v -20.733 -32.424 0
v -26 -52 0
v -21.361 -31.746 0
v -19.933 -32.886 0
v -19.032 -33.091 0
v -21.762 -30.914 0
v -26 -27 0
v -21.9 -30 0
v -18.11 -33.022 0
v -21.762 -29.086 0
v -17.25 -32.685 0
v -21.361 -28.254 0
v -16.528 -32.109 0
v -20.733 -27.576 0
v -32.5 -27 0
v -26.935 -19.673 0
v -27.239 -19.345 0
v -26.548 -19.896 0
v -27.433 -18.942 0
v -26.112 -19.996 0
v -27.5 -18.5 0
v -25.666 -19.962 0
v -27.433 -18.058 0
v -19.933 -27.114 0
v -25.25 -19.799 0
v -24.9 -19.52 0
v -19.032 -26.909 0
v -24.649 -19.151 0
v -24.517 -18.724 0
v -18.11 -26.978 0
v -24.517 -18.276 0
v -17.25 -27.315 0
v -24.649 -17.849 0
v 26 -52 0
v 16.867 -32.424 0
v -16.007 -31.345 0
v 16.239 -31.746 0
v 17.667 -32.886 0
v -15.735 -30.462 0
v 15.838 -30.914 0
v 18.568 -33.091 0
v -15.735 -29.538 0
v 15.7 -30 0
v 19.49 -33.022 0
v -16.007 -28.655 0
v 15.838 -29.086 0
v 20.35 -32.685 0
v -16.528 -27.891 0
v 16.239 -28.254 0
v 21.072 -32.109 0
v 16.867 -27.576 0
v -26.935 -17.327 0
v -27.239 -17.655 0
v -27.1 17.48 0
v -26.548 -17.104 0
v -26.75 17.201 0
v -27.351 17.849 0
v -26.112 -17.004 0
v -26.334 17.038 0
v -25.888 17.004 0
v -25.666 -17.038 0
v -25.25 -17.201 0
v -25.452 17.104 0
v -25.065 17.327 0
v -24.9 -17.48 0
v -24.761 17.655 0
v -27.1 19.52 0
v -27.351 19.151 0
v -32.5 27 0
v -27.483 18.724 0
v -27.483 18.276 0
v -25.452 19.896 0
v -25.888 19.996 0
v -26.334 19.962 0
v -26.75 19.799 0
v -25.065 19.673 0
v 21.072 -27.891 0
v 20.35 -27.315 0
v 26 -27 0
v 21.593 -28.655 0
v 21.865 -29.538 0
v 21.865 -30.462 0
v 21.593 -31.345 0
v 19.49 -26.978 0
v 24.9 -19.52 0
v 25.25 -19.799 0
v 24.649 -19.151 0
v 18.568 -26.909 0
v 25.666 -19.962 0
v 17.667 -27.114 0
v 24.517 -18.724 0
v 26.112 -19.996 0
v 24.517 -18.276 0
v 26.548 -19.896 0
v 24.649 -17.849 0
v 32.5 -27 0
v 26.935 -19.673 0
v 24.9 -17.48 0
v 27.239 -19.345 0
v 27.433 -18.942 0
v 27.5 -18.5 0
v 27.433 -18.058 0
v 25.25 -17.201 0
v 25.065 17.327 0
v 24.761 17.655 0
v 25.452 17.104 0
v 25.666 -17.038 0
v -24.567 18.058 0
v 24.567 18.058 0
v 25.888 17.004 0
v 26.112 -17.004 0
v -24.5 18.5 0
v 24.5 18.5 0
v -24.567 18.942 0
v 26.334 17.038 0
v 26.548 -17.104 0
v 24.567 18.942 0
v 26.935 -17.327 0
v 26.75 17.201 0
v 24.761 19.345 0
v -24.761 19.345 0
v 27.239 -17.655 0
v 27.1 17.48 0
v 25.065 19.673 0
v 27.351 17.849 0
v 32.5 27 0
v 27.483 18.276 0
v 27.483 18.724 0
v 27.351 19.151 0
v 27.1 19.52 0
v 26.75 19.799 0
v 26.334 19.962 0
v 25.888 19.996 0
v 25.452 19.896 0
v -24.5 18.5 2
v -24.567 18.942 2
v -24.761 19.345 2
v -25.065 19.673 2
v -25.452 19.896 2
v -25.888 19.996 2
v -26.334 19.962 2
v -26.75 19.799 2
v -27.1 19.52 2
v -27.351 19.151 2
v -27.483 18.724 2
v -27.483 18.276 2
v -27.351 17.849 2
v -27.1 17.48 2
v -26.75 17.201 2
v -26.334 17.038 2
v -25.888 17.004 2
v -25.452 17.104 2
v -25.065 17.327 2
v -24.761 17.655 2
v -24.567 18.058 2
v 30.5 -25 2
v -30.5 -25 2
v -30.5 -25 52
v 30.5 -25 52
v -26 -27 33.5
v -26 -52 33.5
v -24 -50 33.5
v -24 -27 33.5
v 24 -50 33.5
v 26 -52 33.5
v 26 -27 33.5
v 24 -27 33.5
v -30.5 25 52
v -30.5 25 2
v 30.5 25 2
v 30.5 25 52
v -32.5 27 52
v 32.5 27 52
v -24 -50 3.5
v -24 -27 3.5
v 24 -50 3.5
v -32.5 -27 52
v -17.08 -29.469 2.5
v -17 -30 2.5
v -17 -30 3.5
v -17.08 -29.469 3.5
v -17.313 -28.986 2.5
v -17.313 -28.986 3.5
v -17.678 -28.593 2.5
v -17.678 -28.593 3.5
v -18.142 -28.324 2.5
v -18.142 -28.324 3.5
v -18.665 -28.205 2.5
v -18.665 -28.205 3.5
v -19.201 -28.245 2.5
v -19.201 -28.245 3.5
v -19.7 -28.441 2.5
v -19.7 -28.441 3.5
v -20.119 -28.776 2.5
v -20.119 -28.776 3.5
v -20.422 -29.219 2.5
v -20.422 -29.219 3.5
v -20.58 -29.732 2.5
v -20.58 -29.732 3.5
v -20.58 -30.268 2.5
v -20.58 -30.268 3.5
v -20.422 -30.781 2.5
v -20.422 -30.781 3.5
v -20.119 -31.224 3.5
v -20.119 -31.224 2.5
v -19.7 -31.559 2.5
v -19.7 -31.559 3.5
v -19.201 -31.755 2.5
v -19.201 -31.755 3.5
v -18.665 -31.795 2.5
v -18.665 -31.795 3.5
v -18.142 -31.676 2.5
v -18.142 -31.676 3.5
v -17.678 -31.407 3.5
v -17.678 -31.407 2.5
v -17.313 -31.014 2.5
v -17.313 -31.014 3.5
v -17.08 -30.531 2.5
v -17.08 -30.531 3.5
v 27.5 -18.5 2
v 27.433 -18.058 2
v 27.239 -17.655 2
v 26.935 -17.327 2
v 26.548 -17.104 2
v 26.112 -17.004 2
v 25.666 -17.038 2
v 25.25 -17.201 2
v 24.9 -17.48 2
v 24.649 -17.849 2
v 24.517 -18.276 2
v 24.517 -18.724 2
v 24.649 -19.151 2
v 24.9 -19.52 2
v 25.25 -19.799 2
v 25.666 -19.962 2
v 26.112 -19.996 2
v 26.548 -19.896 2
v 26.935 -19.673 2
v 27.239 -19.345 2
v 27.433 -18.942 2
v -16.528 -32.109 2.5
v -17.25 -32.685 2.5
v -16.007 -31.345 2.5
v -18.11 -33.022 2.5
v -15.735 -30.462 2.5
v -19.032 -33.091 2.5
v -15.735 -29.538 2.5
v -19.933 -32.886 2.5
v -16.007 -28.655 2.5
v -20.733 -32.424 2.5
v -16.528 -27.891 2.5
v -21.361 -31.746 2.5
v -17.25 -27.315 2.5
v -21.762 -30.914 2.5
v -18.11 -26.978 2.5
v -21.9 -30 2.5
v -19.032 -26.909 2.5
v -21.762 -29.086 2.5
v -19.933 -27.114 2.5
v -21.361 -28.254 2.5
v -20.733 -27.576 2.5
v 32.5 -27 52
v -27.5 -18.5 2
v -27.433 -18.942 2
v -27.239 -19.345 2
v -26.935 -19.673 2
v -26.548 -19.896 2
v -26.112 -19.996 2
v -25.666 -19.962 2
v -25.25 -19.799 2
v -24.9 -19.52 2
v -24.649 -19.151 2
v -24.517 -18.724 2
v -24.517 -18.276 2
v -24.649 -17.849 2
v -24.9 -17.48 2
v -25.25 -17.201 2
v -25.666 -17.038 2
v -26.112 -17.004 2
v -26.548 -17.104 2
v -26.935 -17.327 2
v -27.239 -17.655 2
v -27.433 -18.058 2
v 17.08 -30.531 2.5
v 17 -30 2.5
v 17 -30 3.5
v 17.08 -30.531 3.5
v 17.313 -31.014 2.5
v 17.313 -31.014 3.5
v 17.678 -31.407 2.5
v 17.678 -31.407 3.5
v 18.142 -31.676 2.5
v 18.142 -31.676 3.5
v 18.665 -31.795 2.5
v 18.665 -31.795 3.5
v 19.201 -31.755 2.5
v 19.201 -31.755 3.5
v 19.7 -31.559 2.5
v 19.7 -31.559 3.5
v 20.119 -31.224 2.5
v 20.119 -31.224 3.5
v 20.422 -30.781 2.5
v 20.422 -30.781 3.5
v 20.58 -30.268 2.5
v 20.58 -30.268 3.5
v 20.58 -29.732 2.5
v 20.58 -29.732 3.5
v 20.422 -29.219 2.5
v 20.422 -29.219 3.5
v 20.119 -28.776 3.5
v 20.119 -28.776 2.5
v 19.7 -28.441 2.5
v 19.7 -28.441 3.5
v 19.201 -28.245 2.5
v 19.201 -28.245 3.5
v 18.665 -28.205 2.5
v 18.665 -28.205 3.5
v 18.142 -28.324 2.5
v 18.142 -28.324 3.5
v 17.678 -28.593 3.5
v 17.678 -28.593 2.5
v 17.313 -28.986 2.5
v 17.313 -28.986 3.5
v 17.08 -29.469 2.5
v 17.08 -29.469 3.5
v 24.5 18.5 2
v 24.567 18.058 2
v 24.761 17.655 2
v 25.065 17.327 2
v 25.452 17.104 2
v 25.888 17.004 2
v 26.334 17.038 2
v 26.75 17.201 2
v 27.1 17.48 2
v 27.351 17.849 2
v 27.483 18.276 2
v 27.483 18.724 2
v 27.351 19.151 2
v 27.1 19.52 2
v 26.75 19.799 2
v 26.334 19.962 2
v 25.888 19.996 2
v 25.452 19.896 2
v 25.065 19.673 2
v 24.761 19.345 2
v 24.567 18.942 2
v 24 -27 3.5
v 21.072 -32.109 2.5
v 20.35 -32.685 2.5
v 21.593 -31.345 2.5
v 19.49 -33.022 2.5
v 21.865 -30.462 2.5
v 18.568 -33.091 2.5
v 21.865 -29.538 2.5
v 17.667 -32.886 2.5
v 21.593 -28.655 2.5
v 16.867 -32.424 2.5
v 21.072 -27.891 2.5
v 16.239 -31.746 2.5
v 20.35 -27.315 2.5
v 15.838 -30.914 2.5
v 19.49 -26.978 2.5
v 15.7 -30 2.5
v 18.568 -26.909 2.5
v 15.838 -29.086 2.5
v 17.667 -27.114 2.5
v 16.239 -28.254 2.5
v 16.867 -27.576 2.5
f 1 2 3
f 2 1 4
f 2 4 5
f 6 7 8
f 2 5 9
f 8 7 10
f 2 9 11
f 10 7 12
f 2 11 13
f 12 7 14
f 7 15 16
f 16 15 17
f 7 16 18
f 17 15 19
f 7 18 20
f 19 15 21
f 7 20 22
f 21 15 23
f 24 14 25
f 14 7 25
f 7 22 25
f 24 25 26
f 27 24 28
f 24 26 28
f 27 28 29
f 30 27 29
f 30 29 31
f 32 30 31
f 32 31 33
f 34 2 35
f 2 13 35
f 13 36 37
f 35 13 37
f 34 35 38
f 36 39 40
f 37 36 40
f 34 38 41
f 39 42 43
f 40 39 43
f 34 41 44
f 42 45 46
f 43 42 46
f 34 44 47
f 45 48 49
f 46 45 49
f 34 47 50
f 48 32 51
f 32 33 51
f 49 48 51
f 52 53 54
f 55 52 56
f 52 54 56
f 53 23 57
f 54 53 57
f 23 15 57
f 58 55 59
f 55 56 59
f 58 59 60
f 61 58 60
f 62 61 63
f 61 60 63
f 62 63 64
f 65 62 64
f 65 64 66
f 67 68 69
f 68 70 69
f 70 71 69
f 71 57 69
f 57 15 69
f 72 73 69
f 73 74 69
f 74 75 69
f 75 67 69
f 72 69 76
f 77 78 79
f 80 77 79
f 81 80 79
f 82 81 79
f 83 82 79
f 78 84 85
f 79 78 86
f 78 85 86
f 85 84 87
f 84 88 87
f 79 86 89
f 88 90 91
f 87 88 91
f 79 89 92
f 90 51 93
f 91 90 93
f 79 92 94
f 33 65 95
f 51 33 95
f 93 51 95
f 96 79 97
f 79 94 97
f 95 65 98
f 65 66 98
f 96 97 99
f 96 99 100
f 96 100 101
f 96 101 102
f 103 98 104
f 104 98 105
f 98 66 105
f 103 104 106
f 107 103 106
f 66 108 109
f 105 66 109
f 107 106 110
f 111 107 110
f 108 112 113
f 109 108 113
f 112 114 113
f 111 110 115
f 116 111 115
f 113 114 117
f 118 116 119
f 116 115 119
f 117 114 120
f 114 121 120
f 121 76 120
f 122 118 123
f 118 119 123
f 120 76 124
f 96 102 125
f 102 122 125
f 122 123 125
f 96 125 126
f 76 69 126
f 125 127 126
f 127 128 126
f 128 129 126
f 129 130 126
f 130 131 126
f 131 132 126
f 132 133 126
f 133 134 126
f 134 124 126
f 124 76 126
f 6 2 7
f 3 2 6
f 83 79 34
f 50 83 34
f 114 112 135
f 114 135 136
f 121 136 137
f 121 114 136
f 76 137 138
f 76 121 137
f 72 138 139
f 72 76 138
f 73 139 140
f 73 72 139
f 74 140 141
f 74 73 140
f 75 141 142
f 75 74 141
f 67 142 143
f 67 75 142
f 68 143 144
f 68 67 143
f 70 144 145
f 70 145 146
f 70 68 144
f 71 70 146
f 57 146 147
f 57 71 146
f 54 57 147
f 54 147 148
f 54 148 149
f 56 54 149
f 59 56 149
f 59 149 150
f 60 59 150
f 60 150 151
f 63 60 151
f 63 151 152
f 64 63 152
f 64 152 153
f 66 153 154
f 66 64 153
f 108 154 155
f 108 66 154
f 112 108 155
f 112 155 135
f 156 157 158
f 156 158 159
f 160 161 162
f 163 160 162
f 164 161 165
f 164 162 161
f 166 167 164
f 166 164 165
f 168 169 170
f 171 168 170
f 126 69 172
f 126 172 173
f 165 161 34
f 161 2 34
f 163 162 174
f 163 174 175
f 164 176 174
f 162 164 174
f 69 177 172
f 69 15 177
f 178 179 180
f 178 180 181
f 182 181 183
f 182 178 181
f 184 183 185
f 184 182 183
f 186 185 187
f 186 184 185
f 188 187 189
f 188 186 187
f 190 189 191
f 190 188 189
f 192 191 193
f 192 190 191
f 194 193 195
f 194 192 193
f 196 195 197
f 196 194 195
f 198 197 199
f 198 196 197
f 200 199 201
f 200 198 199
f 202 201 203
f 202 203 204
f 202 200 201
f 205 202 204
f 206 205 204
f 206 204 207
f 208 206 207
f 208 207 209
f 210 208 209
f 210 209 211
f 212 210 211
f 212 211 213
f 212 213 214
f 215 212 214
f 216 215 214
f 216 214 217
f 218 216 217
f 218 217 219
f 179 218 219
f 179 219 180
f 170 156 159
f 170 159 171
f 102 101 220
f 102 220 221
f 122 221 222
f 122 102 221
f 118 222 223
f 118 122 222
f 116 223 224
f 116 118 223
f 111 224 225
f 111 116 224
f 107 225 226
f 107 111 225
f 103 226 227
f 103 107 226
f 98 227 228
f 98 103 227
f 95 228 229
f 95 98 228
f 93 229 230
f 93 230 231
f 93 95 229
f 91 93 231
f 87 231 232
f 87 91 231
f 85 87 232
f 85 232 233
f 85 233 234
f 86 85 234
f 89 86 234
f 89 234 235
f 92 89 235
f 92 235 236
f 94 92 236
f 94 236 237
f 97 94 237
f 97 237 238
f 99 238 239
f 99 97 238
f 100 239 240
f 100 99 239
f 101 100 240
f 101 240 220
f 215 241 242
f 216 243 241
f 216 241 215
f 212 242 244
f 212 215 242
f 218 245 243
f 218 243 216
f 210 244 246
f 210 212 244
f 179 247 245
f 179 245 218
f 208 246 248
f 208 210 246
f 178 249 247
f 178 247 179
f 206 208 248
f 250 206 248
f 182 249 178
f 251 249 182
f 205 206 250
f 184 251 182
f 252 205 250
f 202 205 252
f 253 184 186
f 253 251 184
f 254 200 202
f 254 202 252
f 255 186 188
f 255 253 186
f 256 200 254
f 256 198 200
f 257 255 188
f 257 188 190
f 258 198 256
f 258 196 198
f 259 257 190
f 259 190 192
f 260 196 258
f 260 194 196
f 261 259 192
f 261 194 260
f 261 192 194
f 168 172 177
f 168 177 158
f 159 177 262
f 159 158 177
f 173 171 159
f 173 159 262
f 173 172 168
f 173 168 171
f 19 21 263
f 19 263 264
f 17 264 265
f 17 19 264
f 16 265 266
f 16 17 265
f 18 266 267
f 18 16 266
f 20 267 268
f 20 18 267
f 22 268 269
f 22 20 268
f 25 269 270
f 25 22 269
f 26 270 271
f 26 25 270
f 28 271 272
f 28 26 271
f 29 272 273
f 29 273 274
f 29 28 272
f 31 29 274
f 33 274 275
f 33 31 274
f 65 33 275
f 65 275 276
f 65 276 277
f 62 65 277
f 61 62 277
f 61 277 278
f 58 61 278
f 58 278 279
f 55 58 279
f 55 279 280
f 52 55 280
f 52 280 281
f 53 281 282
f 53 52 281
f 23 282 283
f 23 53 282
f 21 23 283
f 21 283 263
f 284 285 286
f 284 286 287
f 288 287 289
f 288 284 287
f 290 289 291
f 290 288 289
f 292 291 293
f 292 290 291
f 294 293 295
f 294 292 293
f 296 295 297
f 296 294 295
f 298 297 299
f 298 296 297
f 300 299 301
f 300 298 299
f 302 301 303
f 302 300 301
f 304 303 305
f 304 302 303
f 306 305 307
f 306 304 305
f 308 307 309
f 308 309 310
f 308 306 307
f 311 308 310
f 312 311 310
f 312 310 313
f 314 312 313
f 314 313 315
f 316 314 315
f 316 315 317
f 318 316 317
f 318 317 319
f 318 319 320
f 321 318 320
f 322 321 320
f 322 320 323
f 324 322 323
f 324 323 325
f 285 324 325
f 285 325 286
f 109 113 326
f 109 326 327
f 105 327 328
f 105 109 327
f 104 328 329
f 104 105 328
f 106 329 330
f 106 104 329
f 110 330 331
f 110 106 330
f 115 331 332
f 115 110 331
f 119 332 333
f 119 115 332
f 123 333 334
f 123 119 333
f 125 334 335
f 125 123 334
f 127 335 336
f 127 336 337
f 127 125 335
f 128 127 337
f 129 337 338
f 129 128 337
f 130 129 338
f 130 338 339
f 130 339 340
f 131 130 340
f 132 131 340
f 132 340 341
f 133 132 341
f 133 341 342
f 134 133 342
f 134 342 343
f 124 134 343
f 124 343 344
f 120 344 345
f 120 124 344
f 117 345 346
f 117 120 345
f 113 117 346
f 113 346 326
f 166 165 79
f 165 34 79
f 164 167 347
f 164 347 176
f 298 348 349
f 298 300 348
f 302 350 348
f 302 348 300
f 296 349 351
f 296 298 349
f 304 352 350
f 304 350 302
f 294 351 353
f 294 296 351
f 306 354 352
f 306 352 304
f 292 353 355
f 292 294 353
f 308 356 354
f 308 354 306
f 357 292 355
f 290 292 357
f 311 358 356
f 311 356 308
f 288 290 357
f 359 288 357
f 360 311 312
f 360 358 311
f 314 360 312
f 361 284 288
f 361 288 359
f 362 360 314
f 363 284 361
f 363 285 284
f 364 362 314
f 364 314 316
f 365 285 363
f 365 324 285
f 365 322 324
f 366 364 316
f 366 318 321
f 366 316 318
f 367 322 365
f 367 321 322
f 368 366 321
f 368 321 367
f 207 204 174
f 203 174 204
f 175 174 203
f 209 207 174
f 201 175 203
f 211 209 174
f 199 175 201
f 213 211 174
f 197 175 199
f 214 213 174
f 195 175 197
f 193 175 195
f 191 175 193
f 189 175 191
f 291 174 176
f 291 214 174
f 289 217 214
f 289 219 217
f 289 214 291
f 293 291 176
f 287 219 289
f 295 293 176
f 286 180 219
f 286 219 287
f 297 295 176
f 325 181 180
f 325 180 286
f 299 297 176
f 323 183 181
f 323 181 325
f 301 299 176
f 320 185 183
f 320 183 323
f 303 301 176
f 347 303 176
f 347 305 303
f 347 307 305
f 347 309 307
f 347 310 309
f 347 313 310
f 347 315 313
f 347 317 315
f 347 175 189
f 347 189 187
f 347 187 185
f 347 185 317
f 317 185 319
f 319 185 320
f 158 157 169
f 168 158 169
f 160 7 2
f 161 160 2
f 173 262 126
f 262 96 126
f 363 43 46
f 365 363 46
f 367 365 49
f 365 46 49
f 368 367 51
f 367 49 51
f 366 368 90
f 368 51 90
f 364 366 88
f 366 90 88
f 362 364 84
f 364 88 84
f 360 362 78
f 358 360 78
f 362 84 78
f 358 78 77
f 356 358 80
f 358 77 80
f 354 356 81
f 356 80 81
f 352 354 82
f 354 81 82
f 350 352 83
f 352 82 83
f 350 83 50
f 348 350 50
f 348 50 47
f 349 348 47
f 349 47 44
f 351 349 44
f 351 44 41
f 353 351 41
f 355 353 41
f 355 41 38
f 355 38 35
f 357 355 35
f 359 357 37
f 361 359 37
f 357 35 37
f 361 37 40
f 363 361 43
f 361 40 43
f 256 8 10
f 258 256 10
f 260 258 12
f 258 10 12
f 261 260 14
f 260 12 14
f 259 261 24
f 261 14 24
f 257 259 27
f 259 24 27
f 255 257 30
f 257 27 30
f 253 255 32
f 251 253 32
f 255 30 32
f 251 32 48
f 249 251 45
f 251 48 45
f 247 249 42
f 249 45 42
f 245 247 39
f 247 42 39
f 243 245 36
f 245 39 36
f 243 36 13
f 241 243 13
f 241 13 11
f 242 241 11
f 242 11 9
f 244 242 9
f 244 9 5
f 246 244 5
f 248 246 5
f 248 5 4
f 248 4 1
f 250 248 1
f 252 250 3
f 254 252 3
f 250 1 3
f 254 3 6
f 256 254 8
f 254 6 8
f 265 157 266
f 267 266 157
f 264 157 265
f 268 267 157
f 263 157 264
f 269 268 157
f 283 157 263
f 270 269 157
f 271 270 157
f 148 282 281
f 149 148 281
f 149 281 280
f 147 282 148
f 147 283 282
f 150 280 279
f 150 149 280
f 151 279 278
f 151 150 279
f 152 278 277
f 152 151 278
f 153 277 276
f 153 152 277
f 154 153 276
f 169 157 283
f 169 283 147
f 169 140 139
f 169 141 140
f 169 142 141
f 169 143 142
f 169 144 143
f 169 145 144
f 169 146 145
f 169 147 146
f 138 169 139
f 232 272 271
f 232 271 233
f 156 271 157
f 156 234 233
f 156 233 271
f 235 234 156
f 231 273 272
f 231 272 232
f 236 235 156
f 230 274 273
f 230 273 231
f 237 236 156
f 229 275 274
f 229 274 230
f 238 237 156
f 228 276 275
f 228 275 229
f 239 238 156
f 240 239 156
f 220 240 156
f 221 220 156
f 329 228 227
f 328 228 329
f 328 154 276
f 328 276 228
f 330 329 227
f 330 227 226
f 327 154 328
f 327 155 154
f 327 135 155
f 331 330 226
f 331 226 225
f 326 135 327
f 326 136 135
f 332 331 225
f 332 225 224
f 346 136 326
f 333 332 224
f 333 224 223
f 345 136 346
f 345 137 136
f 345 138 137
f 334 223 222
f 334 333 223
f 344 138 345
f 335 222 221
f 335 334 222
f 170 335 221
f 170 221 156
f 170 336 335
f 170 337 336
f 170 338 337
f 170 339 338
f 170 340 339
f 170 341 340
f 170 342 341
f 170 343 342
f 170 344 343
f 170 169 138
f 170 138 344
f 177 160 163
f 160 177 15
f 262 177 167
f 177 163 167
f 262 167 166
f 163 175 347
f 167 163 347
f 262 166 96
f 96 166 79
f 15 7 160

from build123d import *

# Parameters (mm, degrees)
SKETCH_1_W          = 65
SKETCH_1_H          = 54
SKETCH_1_R          = 1.5
EXTRUDE_1_DEPTH     = 2
SKETCH_2_W          = 65
SKETCH_2_H          = 54
SKETCH_2_W_2        = 61
SKETCH_2_H_2        = 50
EXTRUDE_2_DEPTH     = 50
SKETCH_6_W          = 52
SKETCH_6_H          = 25
SKETCH_6_R          = 1.8
EXTRUDE_3_DEPTH     = 3.5
EXTRUDE_4_DEPTH     = 30
SKETCH_8_R          = 3.1
CUT_EXTRUDE_1_DEPTH = 2.5


with BuildPart() as part:
    # 草图1 → 凸台-拉伸1 (new body)
    with BuildSketch(Plane.XY):
        Rectangle(SKETCH_1_W, SKETCH_1_H)
        with Locations((-26, 18.5)):
            Circle(SKETCH_1_R, mode=Mode.SUBTRACT)
        with Locations(Location((26, 18.5, 0), (0, 0, 180))):
            Circle(SKETCH_1_R, mode=Mode.SUBTRACT)
        with Locations(Location((-26, -18.5, 0), (0, 0, 180))):
            Circle(SKETCH_1_R, mode=Mode.SUBTRACT)
        with Locations((26, -18.5)):
            Circle(SKETCH_1_R, mode=Mode.SUBTRACT)
    extrude(amount=EXTRUDE_1_DEPTH)

    # 草图2 → 凸台-拉伸2 (add)
    with BuildSketch(Plane.XY.offset(2)):
        Rectangle(SKETCH_2_W, SKETCH_2_H)
        Rectangle(SKETCH_2_W_2, SKETCH_2_H_2, mode=Mode.SUBTRACT)
    extrude(amount=EXTRUDE_2_DEPTH)

    # 草图6 → 凸台-拉伸3 (add)
    with BuildSketch(Plane.XY):
        with Locations((0, -39.5)):
            Rectangle(SKETCH_6_W, SKETCH_6_H)
        with Locations((-18.8, -30)):
            Circle(SKETCH_6_R, mode=Mode.SUBTRACT)
        with Locations(Location((18.8, -30, 0), (0, 0, 180))):
            Circle(SKETCH_6_R, mode=Mode.SUBTRACT)
    extrude(amount=EXTRUDE_3_DEPTH)

    # 草图7 → 凸台-拉伸4 (add)
    with BuildSketch(Plane.XY.offset(3.5)):
        Polygon((-24, -27), (-26, -27), (-26, -52), (26, -52), (26, -27), (24, -27), (24, -50), (-24, -50), align=None)
    extrude(amount=EXTRUDE_4_DEPTH)

    # 草图8 → 切除-拉伸1 (cut)
    with BuildSketch(Plane(origin=(0, 0, 0), x_dir=(-1, 0, 0), z_dir=(0, 0, -1))):
        with Locations((-18.8, -30)):
            Circle(SKETCH_8_R)
        with Locations((18.8, -30)):
            Circle(SKETCH_8_R)
    extrude(amount=-CUT_EXTRUDE_1_DEPTH, mode=Mode.SUBTRACT)


solid = part.part
